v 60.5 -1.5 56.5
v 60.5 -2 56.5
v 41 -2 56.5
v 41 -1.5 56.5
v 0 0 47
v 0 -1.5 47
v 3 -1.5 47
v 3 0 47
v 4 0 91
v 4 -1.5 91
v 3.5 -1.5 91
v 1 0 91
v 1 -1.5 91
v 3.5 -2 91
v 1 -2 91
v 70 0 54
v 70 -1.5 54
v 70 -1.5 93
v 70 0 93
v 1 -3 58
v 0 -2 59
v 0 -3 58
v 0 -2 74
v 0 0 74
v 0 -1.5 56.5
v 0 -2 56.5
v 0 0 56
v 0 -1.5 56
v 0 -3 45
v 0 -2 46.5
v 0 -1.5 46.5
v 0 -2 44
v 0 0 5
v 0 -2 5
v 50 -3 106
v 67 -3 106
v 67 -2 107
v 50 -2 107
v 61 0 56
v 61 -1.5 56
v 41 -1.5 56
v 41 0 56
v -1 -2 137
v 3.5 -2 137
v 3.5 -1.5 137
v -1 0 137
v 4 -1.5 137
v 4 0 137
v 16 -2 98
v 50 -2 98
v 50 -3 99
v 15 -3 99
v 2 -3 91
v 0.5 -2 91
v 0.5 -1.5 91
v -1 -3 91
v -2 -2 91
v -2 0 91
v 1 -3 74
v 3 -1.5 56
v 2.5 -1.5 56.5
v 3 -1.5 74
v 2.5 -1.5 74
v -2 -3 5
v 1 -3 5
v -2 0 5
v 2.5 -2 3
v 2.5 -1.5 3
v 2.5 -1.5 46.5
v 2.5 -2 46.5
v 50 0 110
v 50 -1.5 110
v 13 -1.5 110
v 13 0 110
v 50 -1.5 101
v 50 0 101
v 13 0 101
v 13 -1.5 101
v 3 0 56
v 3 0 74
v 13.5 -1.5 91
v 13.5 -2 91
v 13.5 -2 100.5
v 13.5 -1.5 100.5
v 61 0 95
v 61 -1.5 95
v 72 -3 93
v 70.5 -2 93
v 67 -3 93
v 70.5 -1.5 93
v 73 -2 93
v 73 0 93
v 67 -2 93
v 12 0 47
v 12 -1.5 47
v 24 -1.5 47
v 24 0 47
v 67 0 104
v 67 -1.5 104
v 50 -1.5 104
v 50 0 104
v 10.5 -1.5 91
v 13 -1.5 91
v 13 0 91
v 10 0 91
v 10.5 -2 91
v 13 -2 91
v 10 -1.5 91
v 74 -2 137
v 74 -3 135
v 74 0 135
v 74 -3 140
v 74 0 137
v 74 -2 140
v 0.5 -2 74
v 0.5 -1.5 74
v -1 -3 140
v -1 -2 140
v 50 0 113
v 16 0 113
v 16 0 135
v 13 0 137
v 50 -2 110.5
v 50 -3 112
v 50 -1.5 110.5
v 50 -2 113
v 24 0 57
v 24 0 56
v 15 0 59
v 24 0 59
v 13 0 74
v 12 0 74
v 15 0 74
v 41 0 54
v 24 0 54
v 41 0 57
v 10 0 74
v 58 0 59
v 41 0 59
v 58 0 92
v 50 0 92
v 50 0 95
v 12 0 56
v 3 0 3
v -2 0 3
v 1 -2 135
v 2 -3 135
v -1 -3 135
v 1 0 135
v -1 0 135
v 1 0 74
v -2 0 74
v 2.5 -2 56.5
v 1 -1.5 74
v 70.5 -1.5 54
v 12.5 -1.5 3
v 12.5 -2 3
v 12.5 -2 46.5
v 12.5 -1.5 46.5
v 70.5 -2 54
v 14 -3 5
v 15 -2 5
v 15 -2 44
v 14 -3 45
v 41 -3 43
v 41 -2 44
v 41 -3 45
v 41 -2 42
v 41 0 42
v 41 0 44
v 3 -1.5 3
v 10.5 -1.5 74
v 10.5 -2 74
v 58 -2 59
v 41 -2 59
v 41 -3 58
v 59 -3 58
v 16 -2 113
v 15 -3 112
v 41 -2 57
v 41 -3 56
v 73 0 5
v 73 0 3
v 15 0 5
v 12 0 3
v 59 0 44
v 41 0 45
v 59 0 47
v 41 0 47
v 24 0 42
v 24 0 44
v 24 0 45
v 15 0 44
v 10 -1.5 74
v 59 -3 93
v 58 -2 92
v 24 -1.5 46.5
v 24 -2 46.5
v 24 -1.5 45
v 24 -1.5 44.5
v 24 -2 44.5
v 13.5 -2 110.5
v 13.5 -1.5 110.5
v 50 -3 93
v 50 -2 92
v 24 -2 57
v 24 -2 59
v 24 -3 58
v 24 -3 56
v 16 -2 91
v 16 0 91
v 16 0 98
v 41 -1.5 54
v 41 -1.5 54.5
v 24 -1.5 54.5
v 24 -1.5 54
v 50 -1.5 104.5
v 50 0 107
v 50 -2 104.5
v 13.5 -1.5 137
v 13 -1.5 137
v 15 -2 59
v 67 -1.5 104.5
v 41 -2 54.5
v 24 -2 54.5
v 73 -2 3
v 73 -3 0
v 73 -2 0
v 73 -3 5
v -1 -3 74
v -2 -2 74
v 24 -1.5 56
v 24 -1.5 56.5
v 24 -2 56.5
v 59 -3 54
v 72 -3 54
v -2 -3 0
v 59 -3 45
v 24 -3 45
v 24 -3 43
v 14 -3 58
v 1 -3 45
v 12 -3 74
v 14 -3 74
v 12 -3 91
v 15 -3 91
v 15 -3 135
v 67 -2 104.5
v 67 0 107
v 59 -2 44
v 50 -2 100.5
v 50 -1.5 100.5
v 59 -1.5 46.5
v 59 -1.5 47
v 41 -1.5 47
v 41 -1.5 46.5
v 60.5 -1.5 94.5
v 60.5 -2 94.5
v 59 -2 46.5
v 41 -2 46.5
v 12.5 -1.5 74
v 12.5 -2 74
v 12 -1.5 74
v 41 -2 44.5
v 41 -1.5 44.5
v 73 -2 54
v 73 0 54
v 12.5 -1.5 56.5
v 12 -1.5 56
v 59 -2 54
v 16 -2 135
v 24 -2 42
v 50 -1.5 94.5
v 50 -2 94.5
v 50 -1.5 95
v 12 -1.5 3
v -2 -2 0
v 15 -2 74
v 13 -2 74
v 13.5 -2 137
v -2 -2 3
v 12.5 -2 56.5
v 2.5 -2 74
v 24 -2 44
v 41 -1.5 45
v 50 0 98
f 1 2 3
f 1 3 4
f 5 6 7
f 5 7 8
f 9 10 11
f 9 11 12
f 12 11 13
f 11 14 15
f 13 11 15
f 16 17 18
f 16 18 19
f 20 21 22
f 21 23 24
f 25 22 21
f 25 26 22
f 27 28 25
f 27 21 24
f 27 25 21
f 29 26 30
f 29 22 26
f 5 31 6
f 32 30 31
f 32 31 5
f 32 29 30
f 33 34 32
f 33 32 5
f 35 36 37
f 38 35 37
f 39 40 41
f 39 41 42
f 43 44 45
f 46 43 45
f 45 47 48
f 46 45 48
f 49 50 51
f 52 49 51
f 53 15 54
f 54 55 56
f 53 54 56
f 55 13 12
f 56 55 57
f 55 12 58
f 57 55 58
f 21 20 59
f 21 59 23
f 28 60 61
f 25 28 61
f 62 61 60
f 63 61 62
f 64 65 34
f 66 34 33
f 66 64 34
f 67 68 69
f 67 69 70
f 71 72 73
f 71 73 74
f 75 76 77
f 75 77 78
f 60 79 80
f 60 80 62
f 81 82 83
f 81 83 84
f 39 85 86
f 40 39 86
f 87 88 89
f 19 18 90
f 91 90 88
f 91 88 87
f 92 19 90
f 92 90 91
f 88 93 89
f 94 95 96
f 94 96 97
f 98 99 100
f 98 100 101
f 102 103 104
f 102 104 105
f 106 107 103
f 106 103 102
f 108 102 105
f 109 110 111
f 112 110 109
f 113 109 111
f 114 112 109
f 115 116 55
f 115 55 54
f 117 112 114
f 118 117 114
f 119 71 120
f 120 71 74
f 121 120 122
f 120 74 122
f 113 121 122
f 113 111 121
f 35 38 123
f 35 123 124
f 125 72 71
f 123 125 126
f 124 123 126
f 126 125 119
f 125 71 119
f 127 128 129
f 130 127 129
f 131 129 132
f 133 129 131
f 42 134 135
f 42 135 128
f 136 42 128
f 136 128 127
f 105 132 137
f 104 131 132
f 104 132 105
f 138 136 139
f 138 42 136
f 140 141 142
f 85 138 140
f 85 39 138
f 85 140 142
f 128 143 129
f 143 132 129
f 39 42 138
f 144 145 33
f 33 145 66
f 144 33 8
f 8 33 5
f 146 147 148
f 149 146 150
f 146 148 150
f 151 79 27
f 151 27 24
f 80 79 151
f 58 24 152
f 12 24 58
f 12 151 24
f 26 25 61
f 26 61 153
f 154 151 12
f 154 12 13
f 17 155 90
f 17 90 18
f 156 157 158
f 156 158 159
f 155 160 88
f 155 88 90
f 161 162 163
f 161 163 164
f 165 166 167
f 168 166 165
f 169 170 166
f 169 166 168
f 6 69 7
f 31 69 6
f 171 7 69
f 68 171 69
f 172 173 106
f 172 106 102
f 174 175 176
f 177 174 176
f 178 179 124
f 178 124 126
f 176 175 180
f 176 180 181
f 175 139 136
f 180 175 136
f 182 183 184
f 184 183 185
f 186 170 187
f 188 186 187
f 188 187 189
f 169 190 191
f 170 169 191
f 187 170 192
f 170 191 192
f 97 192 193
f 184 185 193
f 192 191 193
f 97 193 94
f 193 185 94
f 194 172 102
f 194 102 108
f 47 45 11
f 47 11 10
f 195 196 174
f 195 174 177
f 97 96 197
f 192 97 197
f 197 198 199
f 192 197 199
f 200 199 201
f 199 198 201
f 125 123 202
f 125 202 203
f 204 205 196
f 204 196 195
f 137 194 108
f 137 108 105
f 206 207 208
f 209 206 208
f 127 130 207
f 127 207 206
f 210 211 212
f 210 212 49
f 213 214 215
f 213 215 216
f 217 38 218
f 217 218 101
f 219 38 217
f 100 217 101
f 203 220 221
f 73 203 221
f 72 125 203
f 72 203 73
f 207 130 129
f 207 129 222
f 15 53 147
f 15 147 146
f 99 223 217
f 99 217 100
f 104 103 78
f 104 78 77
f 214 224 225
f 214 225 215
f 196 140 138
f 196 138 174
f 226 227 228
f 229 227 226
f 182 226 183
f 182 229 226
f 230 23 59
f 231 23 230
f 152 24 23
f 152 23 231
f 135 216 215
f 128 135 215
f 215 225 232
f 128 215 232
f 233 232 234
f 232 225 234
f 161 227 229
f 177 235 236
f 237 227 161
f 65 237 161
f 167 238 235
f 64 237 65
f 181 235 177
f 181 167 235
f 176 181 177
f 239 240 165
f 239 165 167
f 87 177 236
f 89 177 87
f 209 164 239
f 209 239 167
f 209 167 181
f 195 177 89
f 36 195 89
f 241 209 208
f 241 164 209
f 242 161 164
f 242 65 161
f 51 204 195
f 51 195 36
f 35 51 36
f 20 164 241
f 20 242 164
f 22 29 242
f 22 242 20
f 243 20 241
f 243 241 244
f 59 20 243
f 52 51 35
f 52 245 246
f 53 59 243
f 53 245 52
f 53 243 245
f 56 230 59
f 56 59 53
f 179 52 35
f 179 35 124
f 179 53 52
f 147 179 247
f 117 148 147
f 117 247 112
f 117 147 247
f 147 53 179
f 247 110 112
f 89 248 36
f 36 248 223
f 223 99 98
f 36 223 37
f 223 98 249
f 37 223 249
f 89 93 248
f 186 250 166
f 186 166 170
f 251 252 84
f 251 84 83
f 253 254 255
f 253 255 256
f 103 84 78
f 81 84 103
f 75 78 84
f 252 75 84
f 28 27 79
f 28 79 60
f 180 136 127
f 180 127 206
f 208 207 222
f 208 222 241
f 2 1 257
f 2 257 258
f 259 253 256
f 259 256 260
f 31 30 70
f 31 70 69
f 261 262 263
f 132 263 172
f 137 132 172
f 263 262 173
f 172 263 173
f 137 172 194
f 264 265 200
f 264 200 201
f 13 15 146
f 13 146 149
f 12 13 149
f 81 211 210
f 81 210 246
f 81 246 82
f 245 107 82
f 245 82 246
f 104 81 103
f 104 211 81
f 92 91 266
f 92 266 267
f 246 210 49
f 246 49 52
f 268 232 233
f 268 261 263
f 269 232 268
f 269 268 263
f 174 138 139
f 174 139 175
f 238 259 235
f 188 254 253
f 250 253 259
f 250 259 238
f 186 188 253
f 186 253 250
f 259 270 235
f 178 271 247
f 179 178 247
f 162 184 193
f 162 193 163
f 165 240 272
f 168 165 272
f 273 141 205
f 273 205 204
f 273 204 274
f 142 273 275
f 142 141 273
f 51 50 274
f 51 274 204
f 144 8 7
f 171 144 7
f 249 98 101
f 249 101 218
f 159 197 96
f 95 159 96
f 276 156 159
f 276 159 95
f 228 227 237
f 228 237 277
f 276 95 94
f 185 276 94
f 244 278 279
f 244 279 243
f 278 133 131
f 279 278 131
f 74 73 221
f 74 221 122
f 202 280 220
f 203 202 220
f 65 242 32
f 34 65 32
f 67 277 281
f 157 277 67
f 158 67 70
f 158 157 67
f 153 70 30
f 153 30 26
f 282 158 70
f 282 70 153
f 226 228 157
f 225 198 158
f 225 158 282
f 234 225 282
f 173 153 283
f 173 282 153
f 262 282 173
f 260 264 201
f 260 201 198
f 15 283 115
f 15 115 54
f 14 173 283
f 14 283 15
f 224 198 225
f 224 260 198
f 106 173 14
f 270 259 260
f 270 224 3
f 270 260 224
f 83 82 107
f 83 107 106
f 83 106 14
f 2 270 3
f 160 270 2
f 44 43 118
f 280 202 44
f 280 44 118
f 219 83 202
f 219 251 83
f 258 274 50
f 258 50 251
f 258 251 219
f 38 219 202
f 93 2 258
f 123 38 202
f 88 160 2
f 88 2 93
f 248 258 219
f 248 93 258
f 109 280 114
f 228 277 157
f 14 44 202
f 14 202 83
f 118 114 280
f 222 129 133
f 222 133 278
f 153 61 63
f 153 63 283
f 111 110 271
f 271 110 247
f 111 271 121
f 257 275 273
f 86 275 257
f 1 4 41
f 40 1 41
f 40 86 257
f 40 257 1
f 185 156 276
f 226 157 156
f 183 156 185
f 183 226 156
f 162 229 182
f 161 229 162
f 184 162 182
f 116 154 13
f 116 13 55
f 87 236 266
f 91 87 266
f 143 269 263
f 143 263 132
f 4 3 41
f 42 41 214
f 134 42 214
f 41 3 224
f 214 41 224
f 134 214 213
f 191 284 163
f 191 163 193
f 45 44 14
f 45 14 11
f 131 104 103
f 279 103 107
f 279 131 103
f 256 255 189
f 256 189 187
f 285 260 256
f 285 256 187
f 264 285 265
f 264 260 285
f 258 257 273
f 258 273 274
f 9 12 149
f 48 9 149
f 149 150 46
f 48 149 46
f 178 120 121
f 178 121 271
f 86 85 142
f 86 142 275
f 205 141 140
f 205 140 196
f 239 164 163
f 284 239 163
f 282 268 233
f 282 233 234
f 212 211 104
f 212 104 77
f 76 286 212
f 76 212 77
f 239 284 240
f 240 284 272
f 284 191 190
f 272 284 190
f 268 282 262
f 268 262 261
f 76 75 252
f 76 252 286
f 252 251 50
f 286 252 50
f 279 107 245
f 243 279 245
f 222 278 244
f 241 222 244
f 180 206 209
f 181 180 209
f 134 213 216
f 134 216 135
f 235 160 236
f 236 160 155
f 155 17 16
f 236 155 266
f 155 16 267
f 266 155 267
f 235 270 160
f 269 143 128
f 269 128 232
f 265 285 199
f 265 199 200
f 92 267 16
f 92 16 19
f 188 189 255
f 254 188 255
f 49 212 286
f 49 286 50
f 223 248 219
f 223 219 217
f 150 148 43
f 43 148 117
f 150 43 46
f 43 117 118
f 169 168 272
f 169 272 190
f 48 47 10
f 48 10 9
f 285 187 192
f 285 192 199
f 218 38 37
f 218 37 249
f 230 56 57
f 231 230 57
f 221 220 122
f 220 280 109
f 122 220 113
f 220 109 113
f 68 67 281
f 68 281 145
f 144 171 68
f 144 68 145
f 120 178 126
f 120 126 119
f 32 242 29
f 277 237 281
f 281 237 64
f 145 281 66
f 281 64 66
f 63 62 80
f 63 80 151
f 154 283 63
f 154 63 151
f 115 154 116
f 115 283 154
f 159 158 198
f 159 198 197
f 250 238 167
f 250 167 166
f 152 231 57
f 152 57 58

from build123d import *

# Parameters (mm, degrees)
PAD_DEPTH       = 74
PAD001_DEPTH    = 17
PAD002_DEPTH    = 49
PAD003_DEPTH    = 35
PAD004_DEPTH    = 17
PAD005_DEPTH    = 39
PAD006_DEPTH    = 18
PAD007_DEPTH    = 17
PAD008_DEPTH    = 24
POCKET_DEPTH    = 74
POCKET001_DEPTH = 17
POCKET002_DEPTH = 49
POCKET003_DEPTH = 37
POCKET004_DEPTH = 17
POCKET005_DEPTH = 42
POCKET006_DEPTH = 20
POCKET007_DEPTH = 17
POCKET008_DEPTH = 24
SKETCH020_W     = 3
SKETCH020_H     = 5
PAD009_DEPTH    = 75
SKETCH021_W     = 2
SKETCH021_H     = 3
POCKET009_DEPTH = 75
POCKET010_DEPTH = 2
SKETCH023_W     = 3
SKETCH023_H     = 5
PAD010_DEPTH    = 75
SKETCH024_W     = 2
SKETCH024_H     = 3
POCKET011_DEPTH = 75
POCKET012_DEPTH = 3


with BuildPart() as part:
    # Sketch → Pad (new body)
    with BuildSketch(Plane.XY):
        Polygon((0, 0), (15, 0), (15, -2), (14, -3), (1, -3), (0, -2), align=None)
    extrude(amount=PAD_DEPTH)

    # Sketch002 (on Face8 of Pad) → Pad001 (join)
    with BuildSketch(Plane.XY.offset(74)):
        Polygon((-2, 0), (13, 0), (13, -2), (12, -3), (-1, -3), (-2, -2), align=None)
    extrude(amount=PAD001_DEPTH)

    # Sketch003 (on Face13 of Pad001) → Pad002 (join)
    with BuildSketch(Plane.XY.offset(91)):
        Polygon((1, 0), (16, 0), (16, -2), (15, -3), (2, -3), (1, -2), align=None)
    extrude(amount=PAD002_DEPTH)

    # Sketch004 (on Face21 of Pad002) → Pad003 (join)
    with BuildSketch(Plane(origin=(15, 0, 0), x_dir=(0, 0, -1), z_dir=(1, 0, 0))):
        Polygon((-113, 0), (-98, 0), (-98, -2), (-99, -3), (-112, -3), (-113, -2), align=None)
    extrude(amount=PAD003_DEPTH)

    # Sketch005 (on Face33 of Pad003) → Pad004 (join)
    with BuildSketch(Plane(origin=(50, 0, 0), x_dir=(0, 0, -1), z_dir=(1, 0, 0))):
        Polygon((-107, 0), (-92, 0), (-92, -2), (-93, -3), (-106, -3), (-107, -2), align=None)
    extrude(amount=PAD004_DEPTH)

    # Sketch006 (on Face38 of Pad004) → Pad005 (join)
    with BuildSketch(Plane(origin=(0, 0, 93), x_dir=(-1, 0, 0), z_dir=(0, 0, -1))):
        Polygon((-73, 0), (-58, 0), (-58, -2), (-59, -3), (-72, -3), (-73, -2), align=None)
    extrude(amount=PAD005_DEPTH)

    # Sketch007 (on Face45 of Pad005) → Pad006 (join)
    with BuildSketch(Plane.ZY.offset(-59)):
        Polygon((44, 0), (59, 0), (59, -2), (58, -3), (45, -3), (44, -2), align=None)
    extrude(amount=PAD006_DEPTH)

    # Sketch008 (on Face58 of Pad006) → Pad007 (join)
    with BuildSketch(Plane.ZY.offset(-41)):
        Polygon((42, 0), (57, 0), (57, -2), (56, -3), (43, -3), (42, -2), align=None)
    extrude(amount=PAD007_DEPTH)

    # Sketch009 (on Face66 of Pad007) → Pad008 (join)
    with BuildSketch(Plane.ZY.offset(-24)):
        Polygon((44, 0), (59, 0), (59, -2), (58, -3), (45, -3), (44, -2), align=None)
    extrude(amount=PAD008_DEPTH)

    # Sketch010 (on Face2 of Pad008) → Pocket (cut)
    with BuildSketch(Plane(origin=(0, 0, 0), x_dir=(1, 0, 0), z_dir=(0, 0, -1))):
        Polygon((2.5, 2), (12.5, 2), (12.5, 1.5), (12, 1.5), (12, 0), (3, 0), (3, 1.5), (2.5, 1.5), align=None)
    extrude(amount=-POCKET_DEPTH, mode=Mode.SUBTRACT)

    # Sketch012 (on Face38 of Pocket) → Pocket001 (cut)
    with BuildSketch(Plane(origin=(0, 0, 74), x_dir=(1, 0, 0), z_dir=(0, 0, -1))):
        Polygon((0.5, 2), (10.5, 2), (10.5, 1.5), (10, 1.5), (10, 0), (1, 0), (1, 1.5), (0.5, 1.5), align=None)
    extrude(amount=-POCKET001_DEPTH, mode=Mode.SUBTRACT)

    # Sketch013 (on Face68 of Pocket001) → Pocket002 (cut)
    with BuildSketch(Plane(origin=(0, 0, 91), x_dir=(1, 0, 0), z_dir=(0, 0, -1))):
        Polygon((3.5, 2), (13.5, 2), (13.5, 1.5), (13, 1.5), (13, 0), (4, 0), (4, 1.5), (3.5, 1.5), align=None)
    extrude(amount=-POCKET002_DEPTH, mode=Mode.SUBTRACT)

    # Sketch014 (on Face102 of Pocket002) → Pocket003 (cut)
    with BuildSketch(Plane(origin=(50, 0, 0), x_dir=(0, 0, 1), z_dir=(1, 0, 0))):
        Polygon((100.5, 2), (110.5, 2), (110.5, 1.5), (110, 1.5), (110, 0), (101, 0), (101, 1.5), (100.5, 1.5), align=None)
    extrude(amount=-POCKET003_DEPTH, mode=Mode.SUBTRACT)

    # Sketch015 (on Face132 of Pocket003) → Pocket004 (cut)
    with BuildSketch(Plane(origin=(67, 0, 0), x_dir=(0, 0, 1), z_dir=(1, 0, 0))):
        Polygon((94.5, 2), (104.5, 2), (104.5, 1.5), (104, 1.5), (104, 0), (95, 0), (95, 1.5), (94.5, 1.5), align=None)
    extrude(amount=-POCKET004_DEPTH, mode=Mode.SUBTRACT)

    # Sketch016 (on Face132 of Pocket004) → Pocket005 (cut)
    with BuildSketch(Plane(origin=(0, 0, 54), x_dir=(1, 0, 0), z_dir=(0, 0, -1))):
        Polygon((60.5, 2), (70.5, 2), (70.5, 1.5), (70, 1.5), (70, 0), (61, 0), (61, 1.5), (60.5, 1.5), align=None)
    extrude(amount=-POCKET005_DEPTH, mode=Mode.SUBTRACT)

    # Sketch017 (on Face115 of Pocket005) → Pocket006 (cut)
    with BuildSketch(Plane(origin=(61, 0, 0), x_dir=(0, 0, 1), z_dir=(1, 0, 0))):
        Polygon((46.5, 2), (56.5, 2), (56.5, 1.5), (56, 1.5), (56, 0), (47, 0), (47, 1.5), (46.5, 1.5), align=None)
    extrude(amount=-POCKET006_DEPTH, mode=Mode.SUBTRACT)

    # Sketch018 (on Face90 of Pocket006) → Pocket007 (cut)
    with BuildSketch(Plane(origin=(41, 0, 0), x_dir=(0, 0, 1), z_dir=(1, 0, 0))):
        Polygon((44.5, 2), (54.5, 2), (54.5, 1.5), (54, 1.5), (54, 0), (45, 0), (45, 1.5), (44.5, 1.5), align=None)
    extrude(amount=-POCKET007_DEPTH, mode=Mode.SUBTRACT)

    # Sketch019 (on Face19 of Pocket007) → Pocket008 (cut)
    with BuildSketch(Plane(origin=(0, 0, 0), x_dir=(0, 0, -1), z_dir=(-1, 0, 0))):
        Polygon((-56.5, 2), (-46.5, 2), (-46.5, 1.5), (-47, 1.5), (-47, 0), (-56, 0), (-56, 1.5), (-56.5, 1.5), align=None)
    extrude(amount=-POCKET008_DEPTH, mode=Mode.SUBTRACT)

    # Sketch020 (on Face13 of Pocket008) → Pad009 (join)
    with BuildSketch(Plane.YZ.offset(-2)):
        with Locations((-1.5, 2.5)):
            Rectangle(SKETCH020_W, SKETCH020_H)
    extrude(amount=PAD009_DEPTH)

    # Sketch021 (on Face20 of Pad009) → Pocket009 (cut)
    with BuildSketch(Plane.YZ.offset(73)):
        with Locations((-1, 1.5)):
            Rectangle(SKETCH021_W, SKETCH021_H)
    extrude(amount=-POCKET009_DEPTH, mode=Mode.SUBTRACT)

    # Sketch022 (on Face2 of Pocket009) → Pocket010 (cut)
    with BuildSketch(Plane(origin=(0, 0, 3), x_dir=(1, 0, 0), z_dir=(0, 0, -1))):
        Polygon((2.5, 2), (12.5, 2), (12.5, 1.5), (12, 1.5), (12, 0), (3, 0), (3, 1.5), (2.5, 1.5), align=None)
    extrude(amount=-POCKET010_DEPTH, mode=Mode.SUBTRACT)

    # Sketch023 (on Face185 of Pocket010) → Pad010 (join)
    with BuildSketch(Plane.YZ.offset(-1)):
        with Locations((-1.5, 137.5)):
            Rectangle(SKETCH023_W, SKETCH023_H)
    extrude(amount=PAD010_DEPTH)

    # Sketch024 (on Face226 of Pad010) → Pocket011 (cut)
    with BuildSketch(Plane.YZ.offset(74)):
        with Locations((-1, 138.5)):
            Rectangle(SKETCH024_W, SKETCH024_H)
    extrude(amount=-POCKET011_DEPTH, mode=Mode.SUBTRACT)

    # Sketch025 (on Face209 of Pocket011) → Pocket012 (cut)
    with BuildSketch(Plane(origin=(0, 0, 137), x_dir=(-1, 0, 0), z_dir=(0, 0, 1))):
        Polygon((-13.5, 2), (-3.5, 2), (-3.5, 1.5), (-4, 1.5), (-4, 0), (-13, 0), (-13, 1.5), (-13.5, 1.5), align=None)
    extrude(amount=-POCKET012_DEPTH, mode=Mode.SUBTRACT)


solid = part.part
